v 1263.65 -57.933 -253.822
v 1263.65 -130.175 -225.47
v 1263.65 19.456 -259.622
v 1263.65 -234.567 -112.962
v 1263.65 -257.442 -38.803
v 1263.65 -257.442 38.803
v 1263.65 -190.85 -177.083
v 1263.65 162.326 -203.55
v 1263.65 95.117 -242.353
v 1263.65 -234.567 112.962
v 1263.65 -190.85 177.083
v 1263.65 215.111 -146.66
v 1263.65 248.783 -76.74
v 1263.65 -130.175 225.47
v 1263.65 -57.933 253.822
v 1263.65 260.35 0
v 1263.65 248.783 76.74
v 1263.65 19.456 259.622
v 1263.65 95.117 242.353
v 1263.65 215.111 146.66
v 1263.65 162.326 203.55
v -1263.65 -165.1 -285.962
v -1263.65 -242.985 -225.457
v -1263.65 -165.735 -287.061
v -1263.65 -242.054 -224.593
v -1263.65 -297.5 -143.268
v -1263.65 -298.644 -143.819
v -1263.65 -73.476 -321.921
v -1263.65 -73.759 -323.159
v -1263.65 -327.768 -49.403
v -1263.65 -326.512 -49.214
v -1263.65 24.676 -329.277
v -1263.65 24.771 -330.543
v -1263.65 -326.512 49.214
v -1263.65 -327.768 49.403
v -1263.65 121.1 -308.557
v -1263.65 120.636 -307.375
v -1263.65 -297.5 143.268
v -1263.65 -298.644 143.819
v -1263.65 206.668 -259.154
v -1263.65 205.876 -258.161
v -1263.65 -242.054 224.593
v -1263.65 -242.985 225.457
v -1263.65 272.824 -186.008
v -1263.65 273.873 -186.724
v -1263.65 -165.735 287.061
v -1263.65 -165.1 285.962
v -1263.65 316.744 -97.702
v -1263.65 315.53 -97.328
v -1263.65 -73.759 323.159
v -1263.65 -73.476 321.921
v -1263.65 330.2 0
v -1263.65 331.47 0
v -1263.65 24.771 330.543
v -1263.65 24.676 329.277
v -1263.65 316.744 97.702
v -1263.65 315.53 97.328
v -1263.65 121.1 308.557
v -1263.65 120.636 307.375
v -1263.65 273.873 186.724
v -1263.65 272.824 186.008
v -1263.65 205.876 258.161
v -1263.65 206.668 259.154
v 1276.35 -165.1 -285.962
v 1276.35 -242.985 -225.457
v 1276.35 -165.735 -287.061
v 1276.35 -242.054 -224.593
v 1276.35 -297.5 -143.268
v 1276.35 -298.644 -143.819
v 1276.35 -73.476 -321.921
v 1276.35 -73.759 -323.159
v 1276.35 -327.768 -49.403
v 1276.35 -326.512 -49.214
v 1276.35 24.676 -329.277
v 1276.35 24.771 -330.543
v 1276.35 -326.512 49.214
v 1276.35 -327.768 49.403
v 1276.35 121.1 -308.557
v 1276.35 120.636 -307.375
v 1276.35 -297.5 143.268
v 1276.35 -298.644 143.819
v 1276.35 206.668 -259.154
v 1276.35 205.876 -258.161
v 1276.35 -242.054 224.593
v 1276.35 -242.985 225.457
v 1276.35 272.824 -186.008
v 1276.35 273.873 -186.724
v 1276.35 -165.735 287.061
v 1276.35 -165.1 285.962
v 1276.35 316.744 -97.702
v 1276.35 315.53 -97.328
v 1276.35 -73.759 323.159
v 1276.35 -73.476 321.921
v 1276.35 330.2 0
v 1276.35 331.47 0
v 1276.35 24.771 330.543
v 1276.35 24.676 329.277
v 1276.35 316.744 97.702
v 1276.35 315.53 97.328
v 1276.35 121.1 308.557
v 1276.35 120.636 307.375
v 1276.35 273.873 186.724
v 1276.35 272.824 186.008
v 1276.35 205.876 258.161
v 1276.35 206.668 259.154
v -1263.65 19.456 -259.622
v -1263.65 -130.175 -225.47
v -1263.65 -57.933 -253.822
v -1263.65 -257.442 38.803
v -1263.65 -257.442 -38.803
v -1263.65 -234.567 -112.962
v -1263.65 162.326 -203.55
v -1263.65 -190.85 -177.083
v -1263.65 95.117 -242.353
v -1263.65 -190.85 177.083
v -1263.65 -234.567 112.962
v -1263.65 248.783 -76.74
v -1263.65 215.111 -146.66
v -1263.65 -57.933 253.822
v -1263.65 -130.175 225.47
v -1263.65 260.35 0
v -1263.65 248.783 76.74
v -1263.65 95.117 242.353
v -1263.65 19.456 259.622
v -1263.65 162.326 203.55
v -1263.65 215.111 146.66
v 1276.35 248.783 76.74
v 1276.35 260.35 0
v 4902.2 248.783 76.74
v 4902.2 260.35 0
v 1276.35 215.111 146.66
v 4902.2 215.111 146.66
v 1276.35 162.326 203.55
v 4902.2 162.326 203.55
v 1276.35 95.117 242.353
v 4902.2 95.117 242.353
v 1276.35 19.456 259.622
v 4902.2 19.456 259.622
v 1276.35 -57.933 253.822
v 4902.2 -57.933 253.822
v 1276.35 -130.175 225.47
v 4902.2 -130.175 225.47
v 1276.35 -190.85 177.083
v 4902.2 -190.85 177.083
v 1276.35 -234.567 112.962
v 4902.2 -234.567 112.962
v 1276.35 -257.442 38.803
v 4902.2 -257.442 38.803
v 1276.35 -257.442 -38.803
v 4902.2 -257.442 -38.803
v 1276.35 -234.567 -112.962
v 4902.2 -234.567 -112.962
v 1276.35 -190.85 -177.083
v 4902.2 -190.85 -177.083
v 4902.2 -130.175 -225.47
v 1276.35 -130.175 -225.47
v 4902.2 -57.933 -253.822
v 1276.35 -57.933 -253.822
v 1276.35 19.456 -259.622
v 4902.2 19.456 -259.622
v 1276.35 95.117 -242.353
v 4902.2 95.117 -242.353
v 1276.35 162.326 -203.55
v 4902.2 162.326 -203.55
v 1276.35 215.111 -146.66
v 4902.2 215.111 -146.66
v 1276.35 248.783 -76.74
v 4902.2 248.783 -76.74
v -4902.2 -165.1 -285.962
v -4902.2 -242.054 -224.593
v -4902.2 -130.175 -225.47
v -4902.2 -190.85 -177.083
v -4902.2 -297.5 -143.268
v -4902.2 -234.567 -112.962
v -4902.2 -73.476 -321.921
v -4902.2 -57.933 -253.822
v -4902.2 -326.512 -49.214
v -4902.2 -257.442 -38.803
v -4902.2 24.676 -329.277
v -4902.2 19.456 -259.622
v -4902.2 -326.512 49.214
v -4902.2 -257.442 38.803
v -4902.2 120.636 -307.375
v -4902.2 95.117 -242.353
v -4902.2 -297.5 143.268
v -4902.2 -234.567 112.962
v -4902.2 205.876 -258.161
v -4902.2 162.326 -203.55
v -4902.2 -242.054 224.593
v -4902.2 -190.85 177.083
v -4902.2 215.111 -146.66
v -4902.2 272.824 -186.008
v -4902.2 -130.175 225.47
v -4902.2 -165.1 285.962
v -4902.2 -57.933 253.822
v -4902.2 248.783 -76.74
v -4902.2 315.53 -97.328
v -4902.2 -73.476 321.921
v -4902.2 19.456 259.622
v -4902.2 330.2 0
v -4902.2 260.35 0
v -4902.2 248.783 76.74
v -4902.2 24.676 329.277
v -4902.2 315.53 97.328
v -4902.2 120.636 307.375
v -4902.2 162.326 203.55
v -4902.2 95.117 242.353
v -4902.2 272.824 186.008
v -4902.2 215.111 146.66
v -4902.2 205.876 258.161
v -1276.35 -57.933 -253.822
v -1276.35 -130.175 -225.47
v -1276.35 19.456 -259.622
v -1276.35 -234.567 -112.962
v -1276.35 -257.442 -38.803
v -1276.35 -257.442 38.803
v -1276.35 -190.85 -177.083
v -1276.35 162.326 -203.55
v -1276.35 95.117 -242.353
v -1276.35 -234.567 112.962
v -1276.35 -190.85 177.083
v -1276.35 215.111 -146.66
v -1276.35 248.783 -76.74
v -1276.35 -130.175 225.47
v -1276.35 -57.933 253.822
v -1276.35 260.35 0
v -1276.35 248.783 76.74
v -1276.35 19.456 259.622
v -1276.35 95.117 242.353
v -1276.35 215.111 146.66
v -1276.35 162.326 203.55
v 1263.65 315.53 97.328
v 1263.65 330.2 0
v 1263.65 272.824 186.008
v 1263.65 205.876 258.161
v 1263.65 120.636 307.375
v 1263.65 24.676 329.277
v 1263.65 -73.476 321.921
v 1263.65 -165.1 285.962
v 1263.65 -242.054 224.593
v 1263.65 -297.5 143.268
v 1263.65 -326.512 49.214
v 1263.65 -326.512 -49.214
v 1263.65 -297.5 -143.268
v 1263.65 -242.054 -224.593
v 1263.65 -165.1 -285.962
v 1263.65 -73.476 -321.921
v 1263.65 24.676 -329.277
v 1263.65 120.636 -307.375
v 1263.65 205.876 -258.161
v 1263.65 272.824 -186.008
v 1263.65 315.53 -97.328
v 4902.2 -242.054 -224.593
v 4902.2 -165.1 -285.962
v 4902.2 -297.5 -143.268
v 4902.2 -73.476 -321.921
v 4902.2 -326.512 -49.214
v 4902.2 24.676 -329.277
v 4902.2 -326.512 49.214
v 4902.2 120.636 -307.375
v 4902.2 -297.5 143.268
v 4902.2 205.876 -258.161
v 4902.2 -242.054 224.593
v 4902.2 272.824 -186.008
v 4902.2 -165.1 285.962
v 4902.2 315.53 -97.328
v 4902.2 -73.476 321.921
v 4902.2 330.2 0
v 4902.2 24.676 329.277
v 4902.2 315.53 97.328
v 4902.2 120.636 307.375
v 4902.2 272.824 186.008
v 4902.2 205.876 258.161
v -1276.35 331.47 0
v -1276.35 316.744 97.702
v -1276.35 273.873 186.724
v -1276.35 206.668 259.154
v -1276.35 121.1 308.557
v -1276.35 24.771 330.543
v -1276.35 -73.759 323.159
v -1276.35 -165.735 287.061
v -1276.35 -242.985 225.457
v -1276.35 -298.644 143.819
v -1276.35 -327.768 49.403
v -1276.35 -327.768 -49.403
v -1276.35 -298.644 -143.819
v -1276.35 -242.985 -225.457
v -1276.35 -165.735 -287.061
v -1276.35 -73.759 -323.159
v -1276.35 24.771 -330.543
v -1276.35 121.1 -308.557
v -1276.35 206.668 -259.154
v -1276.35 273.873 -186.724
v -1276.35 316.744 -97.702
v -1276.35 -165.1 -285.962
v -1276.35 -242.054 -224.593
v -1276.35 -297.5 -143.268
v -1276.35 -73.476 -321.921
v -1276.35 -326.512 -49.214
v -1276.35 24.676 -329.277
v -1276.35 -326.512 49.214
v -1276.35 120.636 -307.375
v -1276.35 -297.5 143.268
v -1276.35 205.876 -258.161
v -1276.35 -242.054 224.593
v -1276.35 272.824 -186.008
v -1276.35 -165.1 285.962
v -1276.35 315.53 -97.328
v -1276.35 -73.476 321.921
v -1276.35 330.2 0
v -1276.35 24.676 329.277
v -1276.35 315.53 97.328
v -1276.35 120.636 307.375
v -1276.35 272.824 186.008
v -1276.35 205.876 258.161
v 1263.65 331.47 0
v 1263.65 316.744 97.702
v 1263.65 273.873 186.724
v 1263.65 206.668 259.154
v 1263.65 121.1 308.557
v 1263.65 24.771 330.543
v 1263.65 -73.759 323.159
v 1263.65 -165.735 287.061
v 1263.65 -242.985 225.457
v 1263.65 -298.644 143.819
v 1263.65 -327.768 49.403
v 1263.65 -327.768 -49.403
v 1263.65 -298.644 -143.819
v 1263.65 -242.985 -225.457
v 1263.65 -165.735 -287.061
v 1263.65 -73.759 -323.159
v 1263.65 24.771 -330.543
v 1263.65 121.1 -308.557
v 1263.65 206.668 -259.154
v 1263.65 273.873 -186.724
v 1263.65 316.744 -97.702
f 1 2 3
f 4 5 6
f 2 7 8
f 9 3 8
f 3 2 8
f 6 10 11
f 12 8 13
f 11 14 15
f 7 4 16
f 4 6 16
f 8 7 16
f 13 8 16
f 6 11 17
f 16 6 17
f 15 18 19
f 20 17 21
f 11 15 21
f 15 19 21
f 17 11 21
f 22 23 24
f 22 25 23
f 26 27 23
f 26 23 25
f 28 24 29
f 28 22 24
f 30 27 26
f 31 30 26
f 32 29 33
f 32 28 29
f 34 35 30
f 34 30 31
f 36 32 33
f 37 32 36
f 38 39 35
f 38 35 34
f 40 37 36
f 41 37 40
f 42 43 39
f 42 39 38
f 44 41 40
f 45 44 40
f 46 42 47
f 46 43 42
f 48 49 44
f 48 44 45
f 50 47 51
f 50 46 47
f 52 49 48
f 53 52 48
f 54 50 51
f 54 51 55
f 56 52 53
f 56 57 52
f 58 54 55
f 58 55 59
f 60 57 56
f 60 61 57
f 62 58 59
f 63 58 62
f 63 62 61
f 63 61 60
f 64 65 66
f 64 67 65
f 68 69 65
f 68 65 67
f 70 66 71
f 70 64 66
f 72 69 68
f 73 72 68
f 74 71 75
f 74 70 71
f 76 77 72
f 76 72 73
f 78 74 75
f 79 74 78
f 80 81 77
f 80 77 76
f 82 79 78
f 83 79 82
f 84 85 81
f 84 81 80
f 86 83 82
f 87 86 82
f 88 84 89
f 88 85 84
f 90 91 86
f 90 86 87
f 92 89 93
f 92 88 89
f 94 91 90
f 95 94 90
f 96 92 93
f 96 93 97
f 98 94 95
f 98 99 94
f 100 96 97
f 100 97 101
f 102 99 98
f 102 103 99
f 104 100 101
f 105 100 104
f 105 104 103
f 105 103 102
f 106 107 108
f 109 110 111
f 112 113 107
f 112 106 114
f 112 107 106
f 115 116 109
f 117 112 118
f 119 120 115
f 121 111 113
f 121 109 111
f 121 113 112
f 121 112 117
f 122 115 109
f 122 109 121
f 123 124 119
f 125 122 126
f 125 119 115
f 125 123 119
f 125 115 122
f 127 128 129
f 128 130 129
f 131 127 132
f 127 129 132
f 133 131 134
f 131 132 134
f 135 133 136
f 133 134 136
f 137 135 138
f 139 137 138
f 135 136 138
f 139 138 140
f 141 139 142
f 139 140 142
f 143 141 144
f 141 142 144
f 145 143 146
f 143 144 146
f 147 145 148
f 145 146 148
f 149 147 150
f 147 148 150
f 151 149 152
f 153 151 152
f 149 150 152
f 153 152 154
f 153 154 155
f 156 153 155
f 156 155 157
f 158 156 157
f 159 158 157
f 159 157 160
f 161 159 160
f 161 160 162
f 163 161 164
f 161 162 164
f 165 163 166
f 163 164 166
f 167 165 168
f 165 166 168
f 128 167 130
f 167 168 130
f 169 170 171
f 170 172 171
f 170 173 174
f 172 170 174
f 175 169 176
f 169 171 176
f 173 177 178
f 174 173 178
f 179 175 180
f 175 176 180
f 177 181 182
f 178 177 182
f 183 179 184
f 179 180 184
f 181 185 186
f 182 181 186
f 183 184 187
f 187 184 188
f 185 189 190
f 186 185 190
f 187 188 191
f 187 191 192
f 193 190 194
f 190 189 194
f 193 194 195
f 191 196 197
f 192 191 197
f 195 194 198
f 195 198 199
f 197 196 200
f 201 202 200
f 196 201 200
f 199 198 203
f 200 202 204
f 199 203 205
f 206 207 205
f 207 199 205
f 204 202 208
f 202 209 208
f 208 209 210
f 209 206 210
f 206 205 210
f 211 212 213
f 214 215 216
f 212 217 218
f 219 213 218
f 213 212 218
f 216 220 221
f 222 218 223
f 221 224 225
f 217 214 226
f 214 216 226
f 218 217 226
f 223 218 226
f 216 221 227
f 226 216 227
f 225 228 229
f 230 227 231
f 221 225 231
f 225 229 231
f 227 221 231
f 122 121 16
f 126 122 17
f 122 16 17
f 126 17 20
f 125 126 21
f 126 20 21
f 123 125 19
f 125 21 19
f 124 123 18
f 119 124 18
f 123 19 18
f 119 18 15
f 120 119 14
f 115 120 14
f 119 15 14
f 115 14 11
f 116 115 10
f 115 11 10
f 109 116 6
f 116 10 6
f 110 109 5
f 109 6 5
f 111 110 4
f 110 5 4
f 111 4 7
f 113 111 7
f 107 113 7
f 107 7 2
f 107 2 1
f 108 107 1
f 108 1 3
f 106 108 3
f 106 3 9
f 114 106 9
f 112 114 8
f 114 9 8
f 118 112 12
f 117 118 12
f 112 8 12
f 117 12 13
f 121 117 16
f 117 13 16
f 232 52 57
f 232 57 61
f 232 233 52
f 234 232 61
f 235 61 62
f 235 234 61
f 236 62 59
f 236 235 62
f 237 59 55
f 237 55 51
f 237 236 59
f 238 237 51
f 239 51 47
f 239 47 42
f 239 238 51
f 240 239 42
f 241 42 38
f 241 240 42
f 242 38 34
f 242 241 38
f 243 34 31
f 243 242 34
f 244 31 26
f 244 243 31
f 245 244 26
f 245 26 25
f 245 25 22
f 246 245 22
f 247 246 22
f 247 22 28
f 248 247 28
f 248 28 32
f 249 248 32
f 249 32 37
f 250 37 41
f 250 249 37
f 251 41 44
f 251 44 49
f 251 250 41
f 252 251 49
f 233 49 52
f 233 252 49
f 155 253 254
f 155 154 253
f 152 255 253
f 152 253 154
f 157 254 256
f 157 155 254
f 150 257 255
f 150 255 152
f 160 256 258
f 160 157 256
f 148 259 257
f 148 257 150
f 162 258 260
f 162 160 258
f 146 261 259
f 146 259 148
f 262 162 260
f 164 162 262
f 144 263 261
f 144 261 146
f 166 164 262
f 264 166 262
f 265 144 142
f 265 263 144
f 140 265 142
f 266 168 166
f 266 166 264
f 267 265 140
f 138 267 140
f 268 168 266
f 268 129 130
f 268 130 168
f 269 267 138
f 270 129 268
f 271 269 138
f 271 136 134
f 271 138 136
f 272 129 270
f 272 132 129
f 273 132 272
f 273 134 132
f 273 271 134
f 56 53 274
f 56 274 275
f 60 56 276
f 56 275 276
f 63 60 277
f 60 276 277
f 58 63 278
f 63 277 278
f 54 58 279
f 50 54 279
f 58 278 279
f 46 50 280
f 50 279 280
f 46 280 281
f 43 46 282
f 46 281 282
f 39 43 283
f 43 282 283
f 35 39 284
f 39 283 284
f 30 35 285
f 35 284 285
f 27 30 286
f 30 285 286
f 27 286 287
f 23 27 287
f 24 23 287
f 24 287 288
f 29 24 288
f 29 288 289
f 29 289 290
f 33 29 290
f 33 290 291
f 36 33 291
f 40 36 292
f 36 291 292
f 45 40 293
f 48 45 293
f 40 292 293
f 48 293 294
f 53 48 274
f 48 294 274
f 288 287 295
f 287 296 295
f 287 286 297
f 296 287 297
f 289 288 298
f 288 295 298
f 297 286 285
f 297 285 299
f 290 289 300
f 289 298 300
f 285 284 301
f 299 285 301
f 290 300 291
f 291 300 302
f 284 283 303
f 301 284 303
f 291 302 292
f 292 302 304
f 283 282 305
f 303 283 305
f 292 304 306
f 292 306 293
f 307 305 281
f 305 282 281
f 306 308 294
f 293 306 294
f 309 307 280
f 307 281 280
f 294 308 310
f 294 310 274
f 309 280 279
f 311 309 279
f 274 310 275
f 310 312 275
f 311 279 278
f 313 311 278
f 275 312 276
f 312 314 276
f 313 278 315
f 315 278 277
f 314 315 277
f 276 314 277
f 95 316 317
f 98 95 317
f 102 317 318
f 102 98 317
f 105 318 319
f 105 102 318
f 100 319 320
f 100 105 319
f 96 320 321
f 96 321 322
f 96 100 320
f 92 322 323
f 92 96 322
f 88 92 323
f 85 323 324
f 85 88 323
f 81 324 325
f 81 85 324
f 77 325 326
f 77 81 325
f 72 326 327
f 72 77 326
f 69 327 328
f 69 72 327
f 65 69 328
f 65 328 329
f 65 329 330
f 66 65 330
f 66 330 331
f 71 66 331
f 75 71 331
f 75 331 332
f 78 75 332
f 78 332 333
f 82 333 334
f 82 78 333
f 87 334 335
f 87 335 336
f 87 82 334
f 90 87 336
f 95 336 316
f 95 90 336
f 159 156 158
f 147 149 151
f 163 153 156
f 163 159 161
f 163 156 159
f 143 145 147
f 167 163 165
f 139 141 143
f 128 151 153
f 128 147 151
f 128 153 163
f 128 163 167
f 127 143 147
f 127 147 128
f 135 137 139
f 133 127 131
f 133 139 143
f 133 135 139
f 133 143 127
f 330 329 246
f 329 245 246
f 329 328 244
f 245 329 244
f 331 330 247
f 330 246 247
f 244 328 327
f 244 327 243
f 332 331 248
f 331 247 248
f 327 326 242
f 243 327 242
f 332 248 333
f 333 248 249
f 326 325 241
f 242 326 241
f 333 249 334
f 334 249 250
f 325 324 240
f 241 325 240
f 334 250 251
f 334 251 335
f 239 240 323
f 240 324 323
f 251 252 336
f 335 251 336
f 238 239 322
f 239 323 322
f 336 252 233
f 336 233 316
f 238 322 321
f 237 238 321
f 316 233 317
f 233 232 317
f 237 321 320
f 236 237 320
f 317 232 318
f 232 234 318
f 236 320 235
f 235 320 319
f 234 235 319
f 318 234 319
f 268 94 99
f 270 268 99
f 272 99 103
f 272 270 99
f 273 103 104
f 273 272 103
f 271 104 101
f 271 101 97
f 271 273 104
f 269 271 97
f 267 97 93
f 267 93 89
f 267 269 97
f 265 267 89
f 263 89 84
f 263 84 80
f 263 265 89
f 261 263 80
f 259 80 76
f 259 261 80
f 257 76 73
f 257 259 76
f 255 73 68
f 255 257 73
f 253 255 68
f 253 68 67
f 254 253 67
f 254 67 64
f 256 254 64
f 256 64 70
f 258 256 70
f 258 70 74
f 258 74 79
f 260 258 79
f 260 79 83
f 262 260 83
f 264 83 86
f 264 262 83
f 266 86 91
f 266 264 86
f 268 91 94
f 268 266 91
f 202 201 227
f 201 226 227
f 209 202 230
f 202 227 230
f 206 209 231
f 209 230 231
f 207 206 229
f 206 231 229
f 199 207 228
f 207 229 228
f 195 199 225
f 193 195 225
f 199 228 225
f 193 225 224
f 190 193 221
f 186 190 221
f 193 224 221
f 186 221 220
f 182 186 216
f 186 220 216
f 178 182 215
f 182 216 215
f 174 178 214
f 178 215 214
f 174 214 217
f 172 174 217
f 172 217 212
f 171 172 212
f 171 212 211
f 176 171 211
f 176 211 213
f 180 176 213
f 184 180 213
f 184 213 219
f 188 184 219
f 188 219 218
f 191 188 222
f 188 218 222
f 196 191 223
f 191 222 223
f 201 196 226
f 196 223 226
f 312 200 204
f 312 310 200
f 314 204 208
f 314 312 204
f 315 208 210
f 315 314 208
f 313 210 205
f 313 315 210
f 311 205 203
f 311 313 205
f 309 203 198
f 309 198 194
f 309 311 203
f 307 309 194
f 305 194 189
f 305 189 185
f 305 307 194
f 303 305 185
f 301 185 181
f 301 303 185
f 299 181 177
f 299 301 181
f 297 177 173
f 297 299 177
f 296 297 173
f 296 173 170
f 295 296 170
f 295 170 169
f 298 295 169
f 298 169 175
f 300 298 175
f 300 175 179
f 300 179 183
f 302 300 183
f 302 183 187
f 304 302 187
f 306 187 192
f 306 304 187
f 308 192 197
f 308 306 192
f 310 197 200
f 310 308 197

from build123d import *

# Parameters (mm, degrees)
F0_R     = 330.2
F1_DEPTH = 4902.2
F2_R     = 260.35
F3_DEPTH = 5080
F5_R     = 331.47
F6_DEPTH = 6.35


# Not quite as in the source:
# - a pattern or mirror of a feature is missing from the dataset's text; its kind, count and spacing are read off the source's solid


with BuildPart() as f1:
    # F0 (on Right) → F1 (new body, symmetric)
    with BuildSketch(Plane.YZ):
        Circle(F0_R)
    extrude(amount=F1_DEPTH, both=True)

    # F2 (on Right) → F3 (cut, symmetric)
    with BuildSketch(Plane.YZ):
        Circle(F2_R)
    extrude(amount=F3_DEPTH, both=True, mode=Mode.SUBTRACT)

    # F5 (on offset) → F6 (join, symmetric)
    with BuildSketch(Plane.YZ.offset(1270)):
        Circle(F5_R)
    f6 = extrude(amount=F6_DEPTH, both=True)

    # F6_copies: F6 across plane
    add(f6.mirror(Plane(origin=(0, 0, 0), x_dir=(0, 0, -1), z_dir=(-1, 0, 0))))


solid = f1.part
